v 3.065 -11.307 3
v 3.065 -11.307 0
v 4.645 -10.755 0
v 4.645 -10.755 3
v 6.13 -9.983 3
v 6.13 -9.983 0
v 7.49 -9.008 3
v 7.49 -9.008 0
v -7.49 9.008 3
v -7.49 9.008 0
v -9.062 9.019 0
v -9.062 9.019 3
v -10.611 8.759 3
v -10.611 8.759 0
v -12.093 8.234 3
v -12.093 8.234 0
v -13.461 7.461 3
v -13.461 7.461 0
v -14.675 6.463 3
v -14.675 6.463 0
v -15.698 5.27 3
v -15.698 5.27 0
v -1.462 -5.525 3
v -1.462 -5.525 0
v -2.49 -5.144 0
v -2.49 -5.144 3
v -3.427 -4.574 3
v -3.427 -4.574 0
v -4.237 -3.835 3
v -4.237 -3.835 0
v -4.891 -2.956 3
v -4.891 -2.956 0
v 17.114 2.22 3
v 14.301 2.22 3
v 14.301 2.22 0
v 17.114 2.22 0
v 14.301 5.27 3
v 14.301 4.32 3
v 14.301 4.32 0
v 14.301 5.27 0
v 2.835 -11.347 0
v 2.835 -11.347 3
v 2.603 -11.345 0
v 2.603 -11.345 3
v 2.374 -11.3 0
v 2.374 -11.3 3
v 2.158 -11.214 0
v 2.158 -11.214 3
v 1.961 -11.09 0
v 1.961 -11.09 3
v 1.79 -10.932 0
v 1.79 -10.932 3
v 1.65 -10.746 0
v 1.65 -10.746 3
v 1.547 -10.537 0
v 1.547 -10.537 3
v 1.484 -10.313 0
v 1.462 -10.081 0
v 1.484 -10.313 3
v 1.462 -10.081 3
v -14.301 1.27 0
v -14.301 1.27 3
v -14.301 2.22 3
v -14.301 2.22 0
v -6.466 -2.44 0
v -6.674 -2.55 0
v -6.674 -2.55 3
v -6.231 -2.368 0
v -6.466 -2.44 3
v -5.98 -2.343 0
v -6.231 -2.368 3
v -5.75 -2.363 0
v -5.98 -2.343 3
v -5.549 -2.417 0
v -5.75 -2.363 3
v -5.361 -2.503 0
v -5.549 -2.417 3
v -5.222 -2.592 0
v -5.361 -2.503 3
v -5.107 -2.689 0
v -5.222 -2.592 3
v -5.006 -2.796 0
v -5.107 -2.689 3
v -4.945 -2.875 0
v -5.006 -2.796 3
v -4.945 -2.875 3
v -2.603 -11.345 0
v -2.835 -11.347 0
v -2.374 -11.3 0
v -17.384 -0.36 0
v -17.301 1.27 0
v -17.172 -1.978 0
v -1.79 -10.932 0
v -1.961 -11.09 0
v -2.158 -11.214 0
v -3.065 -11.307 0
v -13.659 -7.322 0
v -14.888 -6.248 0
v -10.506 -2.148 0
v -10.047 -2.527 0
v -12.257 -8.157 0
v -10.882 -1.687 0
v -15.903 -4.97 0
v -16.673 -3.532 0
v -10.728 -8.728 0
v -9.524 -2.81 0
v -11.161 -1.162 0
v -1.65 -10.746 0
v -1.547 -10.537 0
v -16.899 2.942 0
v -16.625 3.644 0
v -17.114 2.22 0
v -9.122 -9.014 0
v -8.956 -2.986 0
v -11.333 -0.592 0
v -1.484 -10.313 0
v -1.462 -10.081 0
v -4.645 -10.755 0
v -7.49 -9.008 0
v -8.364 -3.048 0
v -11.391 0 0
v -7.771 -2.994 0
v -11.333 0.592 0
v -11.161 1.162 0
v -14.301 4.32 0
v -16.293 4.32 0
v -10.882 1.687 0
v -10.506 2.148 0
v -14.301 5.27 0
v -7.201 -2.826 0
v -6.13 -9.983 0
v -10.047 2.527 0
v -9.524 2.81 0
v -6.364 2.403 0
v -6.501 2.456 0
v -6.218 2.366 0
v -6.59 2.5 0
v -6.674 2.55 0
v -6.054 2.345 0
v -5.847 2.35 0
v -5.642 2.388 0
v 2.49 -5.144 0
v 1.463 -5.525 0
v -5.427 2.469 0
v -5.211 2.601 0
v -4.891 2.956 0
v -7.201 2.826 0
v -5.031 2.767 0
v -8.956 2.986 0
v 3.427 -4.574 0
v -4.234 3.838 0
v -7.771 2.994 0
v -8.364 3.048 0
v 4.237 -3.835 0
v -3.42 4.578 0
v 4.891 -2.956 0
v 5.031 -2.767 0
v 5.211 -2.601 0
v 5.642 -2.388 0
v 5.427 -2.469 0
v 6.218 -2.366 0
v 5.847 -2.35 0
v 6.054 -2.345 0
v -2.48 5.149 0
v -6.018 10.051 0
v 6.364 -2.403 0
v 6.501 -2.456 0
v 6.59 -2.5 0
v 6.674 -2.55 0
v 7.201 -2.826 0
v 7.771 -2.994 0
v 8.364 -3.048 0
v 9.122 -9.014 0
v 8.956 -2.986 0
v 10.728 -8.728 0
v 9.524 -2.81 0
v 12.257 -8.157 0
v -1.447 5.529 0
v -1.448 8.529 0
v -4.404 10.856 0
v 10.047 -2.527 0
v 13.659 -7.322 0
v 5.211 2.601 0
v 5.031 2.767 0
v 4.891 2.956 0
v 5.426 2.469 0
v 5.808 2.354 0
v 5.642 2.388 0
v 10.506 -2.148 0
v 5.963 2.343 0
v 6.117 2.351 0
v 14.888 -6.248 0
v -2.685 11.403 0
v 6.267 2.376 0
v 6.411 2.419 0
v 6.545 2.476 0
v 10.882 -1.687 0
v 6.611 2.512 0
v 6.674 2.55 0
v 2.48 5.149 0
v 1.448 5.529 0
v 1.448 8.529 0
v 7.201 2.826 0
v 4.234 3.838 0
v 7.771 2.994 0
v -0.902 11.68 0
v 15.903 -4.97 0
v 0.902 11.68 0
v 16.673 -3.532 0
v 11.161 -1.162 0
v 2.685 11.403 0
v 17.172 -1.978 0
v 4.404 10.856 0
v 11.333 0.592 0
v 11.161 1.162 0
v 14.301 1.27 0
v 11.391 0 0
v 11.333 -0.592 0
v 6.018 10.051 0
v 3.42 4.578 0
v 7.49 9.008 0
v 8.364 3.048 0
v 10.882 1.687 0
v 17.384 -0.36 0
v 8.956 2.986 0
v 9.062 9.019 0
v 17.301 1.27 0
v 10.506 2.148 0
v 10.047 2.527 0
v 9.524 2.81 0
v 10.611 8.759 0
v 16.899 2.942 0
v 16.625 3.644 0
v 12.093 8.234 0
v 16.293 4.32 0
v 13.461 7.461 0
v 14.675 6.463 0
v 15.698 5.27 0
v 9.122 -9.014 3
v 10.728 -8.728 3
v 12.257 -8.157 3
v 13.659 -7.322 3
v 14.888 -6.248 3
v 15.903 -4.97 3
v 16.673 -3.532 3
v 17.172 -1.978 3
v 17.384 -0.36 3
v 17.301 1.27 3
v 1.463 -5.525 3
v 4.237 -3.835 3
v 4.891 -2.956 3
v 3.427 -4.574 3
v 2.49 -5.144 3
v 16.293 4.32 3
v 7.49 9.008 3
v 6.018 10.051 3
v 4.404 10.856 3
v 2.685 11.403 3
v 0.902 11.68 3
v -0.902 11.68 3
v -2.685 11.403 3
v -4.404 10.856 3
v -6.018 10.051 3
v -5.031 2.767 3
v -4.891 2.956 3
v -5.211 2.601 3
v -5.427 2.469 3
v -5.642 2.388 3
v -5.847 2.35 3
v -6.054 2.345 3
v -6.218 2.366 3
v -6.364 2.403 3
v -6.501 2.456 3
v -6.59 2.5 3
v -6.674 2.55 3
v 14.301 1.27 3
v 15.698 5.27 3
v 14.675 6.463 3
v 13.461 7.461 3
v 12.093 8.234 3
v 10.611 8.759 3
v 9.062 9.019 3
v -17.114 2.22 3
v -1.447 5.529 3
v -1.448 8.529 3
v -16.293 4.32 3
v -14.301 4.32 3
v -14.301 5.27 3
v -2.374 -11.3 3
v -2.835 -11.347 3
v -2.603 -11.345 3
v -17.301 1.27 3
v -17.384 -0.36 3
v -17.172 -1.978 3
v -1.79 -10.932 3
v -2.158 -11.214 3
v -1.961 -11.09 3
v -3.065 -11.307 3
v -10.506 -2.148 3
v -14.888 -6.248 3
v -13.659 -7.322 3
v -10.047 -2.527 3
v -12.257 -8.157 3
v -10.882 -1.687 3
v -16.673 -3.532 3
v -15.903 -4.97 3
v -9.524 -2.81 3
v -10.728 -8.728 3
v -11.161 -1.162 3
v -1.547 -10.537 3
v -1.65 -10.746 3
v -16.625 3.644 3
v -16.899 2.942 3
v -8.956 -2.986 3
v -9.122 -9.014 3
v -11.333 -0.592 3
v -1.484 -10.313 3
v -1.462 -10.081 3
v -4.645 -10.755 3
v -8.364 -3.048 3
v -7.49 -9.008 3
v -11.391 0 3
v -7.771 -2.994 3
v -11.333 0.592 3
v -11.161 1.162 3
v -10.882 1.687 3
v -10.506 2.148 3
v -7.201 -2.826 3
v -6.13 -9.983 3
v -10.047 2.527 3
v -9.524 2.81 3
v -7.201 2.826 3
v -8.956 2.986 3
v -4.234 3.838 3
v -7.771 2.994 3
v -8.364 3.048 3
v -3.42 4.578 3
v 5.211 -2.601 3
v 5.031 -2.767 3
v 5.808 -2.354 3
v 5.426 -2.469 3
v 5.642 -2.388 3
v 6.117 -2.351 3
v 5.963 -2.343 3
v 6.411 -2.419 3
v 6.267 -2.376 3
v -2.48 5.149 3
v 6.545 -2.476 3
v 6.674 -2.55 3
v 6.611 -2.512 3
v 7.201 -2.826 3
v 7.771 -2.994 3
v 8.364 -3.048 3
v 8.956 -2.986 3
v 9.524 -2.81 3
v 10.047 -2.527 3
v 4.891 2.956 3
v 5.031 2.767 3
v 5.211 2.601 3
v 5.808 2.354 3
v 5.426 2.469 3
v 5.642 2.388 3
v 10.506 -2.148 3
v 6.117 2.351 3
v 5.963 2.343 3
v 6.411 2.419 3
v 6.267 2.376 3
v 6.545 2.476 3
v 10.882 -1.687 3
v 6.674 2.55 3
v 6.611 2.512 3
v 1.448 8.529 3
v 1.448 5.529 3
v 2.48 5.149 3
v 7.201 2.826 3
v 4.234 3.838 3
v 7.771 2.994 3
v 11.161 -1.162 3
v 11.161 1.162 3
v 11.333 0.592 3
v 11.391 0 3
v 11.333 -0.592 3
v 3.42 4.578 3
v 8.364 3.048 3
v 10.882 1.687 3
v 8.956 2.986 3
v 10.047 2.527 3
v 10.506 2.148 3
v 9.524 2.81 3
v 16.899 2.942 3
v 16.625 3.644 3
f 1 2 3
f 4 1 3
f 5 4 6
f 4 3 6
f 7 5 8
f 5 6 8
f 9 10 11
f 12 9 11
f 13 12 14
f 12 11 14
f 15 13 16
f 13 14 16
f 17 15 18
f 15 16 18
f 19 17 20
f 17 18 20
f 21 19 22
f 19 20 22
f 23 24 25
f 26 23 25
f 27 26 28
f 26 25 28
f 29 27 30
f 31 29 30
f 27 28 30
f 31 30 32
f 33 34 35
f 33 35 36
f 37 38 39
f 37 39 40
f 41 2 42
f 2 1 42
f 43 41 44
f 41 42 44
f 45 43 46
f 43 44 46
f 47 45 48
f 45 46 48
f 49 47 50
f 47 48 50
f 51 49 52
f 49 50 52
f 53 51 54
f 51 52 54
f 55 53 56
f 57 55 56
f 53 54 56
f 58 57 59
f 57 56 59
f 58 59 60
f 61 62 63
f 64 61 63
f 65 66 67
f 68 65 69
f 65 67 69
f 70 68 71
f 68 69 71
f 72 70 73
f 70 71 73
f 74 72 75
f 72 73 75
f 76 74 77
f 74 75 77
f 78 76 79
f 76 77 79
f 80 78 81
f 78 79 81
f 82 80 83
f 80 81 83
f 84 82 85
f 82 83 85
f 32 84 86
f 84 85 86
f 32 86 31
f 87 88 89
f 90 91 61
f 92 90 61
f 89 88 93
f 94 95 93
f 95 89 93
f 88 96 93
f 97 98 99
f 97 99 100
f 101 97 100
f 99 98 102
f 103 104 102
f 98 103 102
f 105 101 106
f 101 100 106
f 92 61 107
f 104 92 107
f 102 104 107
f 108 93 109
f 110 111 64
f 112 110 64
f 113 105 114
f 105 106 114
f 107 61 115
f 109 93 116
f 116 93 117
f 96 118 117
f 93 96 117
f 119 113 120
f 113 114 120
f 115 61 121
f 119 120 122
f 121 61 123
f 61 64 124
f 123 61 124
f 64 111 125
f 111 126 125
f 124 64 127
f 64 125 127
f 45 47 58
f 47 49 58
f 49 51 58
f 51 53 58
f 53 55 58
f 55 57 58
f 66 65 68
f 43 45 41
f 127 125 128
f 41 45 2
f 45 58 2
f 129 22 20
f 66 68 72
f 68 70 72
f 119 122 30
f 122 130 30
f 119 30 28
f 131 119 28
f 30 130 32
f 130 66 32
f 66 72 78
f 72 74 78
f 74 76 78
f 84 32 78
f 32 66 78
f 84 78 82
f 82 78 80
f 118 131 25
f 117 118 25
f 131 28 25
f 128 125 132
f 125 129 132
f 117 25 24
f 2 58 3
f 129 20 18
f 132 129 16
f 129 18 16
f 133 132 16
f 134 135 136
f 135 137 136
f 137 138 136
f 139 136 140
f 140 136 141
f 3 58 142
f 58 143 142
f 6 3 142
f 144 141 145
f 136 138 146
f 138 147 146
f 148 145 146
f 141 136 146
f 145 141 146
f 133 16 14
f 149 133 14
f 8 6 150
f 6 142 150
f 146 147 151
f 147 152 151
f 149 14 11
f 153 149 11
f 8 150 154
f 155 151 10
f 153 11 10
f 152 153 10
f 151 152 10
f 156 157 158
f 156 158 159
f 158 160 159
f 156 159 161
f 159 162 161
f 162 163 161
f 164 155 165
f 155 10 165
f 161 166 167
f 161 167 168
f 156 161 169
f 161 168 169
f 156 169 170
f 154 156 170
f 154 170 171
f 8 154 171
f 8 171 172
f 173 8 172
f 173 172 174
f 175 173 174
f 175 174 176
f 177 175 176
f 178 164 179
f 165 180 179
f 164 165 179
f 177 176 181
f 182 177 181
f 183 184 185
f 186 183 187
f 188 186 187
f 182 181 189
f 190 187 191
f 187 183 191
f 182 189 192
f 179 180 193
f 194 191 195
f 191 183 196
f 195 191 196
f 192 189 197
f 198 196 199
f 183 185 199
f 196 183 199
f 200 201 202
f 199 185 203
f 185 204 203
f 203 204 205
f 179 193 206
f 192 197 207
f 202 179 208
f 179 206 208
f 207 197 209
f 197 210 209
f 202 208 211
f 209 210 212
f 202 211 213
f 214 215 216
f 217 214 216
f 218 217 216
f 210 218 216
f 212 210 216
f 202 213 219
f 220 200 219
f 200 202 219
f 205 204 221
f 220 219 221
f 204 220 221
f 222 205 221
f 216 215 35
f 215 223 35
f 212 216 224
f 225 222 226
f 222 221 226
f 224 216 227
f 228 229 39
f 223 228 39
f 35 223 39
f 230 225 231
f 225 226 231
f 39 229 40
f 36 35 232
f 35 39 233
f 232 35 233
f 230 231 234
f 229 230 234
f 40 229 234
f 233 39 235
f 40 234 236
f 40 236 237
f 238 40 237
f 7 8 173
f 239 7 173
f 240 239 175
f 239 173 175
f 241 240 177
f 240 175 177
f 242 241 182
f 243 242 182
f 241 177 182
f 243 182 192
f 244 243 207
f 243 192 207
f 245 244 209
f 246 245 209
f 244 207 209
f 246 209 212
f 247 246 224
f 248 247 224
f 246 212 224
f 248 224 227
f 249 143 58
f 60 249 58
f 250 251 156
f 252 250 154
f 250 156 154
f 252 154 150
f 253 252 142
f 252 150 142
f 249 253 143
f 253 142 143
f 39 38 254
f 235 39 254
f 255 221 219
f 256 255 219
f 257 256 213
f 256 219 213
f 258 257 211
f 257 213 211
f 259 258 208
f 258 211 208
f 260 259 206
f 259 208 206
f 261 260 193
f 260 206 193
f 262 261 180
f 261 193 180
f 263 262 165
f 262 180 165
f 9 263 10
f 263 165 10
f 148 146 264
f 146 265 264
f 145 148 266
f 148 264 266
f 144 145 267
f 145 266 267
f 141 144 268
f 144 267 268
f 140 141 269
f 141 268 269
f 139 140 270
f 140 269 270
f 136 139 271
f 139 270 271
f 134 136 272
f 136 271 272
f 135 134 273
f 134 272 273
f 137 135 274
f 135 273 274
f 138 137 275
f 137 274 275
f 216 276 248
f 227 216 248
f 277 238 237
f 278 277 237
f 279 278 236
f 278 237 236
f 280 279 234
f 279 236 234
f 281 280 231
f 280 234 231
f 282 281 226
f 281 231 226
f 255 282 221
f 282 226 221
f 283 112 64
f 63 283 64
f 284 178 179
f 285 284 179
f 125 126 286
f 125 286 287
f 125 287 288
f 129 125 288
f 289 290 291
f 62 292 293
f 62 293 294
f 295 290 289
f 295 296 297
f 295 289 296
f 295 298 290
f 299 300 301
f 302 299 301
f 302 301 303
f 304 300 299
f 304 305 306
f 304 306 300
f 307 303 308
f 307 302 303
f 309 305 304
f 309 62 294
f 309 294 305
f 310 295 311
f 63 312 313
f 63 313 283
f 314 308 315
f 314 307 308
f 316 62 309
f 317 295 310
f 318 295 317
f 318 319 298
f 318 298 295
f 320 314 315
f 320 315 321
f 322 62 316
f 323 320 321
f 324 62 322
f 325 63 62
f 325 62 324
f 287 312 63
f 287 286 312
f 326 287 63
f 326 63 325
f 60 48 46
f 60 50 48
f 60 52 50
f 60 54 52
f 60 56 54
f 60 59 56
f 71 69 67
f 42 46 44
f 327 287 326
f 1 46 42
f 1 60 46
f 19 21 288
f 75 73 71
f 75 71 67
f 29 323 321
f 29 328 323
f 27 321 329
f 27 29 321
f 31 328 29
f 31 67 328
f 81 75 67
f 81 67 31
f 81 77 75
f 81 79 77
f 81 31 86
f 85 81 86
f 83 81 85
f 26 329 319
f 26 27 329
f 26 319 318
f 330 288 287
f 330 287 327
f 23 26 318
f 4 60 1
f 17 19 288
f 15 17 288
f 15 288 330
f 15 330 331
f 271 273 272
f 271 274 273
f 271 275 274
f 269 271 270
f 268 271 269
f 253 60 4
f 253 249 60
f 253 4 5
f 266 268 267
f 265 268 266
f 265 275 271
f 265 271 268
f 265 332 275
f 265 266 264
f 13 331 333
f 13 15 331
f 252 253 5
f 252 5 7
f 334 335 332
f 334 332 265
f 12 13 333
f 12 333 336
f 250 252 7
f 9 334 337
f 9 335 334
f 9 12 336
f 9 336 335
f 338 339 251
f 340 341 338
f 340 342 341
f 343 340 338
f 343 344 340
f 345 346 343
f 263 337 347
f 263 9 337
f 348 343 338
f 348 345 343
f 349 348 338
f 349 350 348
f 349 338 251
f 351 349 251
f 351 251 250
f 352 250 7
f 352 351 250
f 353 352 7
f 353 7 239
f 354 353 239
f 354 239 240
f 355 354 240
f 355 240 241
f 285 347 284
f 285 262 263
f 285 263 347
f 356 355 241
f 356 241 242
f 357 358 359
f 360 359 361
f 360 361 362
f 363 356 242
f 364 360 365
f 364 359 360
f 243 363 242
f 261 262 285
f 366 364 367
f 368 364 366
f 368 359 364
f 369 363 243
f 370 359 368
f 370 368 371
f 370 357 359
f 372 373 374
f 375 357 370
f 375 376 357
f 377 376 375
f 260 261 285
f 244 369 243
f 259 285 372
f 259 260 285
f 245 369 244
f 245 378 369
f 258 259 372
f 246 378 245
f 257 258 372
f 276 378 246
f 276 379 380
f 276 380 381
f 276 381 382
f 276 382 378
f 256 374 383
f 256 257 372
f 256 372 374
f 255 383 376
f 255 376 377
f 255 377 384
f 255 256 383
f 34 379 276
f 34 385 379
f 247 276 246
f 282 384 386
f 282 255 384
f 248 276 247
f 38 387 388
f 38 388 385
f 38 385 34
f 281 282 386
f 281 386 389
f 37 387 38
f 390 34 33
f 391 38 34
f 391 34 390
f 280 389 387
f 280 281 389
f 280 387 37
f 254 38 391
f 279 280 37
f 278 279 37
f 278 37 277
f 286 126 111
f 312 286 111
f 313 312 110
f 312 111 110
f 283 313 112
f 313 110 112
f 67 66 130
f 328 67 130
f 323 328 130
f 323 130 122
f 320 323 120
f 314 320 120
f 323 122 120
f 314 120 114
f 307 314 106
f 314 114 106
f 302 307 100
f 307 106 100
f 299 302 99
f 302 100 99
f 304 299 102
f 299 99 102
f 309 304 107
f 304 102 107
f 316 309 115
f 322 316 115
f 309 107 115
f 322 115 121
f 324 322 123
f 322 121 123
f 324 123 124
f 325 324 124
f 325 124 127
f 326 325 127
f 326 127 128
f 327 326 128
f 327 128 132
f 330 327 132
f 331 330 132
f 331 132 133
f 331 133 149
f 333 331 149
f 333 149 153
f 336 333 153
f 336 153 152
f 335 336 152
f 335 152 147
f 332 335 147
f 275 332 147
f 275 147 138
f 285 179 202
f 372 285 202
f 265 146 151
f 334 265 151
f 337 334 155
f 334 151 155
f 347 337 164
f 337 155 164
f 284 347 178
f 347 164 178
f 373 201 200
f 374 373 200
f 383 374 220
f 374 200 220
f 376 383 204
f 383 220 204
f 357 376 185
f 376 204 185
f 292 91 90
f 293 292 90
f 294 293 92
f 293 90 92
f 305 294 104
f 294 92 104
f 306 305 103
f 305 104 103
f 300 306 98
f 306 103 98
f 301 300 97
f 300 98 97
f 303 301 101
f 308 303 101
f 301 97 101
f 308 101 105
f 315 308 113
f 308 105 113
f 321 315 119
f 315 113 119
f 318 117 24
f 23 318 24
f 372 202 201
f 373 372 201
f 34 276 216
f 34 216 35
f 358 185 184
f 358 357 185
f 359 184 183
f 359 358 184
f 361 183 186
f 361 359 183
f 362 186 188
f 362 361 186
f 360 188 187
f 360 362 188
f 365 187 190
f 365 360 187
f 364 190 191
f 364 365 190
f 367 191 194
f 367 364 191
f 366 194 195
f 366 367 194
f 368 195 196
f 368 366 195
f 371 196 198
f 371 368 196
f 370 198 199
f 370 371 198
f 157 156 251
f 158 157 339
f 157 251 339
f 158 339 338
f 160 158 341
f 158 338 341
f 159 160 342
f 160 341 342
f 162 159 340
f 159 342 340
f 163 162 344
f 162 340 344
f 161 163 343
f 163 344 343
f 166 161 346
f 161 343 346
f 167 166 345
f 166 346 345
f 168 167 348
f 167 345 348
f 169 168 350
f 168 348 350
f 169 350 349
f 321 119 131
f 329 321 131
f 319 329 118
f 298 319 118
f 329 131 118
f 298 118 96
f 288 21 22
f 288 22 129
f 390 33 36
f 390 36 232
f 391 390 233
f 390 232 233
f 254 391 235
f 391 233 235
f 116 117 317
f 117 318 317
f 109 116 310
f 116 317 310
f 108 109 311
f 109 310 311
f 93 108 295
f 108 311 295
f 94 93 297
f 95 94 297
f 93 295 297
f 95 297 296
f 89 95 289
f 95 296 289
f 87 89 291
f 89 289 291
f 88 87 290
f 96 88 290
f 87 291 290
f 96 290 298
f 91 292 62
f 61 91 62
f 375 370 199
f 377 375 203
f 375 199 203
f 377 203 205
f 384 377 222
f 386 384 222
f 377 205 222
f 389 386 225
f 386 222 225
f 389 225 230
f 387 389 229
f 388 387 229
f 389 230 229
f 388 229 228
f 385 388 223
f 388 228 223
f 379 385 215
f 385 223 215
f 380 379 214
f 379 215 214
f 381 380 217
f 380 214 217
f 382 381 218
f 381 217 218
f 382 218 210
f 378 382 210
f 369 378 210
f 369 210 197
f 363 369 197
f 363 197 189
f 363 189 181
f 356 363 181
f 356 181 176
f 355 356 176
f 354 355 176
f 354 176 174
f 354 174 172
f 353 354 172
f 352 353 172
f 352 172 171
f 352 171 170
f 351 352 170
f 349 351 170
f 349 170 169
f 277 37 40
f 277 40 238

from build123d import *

# Parameters (mm, degrees)
EXTRUDE_1_DEPTH     = 3
SKETCH_2_W          = 3
SKETCH_2_H          = 0.95
CUT_EXTRUDE_1_DEPTH = 3
FILLET_1_R          = 1.27


with BuildPart() as part:
    # 스케치1 → 보스-돌출1 (new body)
    with BuildSketch(Plane.XY):
        with BuildLine():
            Line((-1.4475, 8.528649813), (1.4475, 8.528649813))
            Line((1.4475, 8.528649813), (1.4475, 5.528649813))
            ThreePointArc((1.4475, 5.528649813), (4.105207543, 3.975989943), (5.572102386, 1.27))
            ThreePointArc((5.572102386, 1.27), (11.390915263, 0), (5.572102386, -1.27))
            ThreePointArc((5.572102386, -1.27), (4.110599393, -3.970415297), (1.4625, -5.524700784))
            Line((1.4625, -5.524700784), (1.4625, -11.623352303))
            ThreePointArc((1.4625, -11.623352303), (4.663454339, -10.746786433), (7.490136969, -9.007722974))
            ThreePointArc((7.490136969, -9.007722974), (17.390915263, 0), (7.490136969, 9.007722974))
            ThreePointArc((7.490136969, 9.007722974), (0, 11.715), (-7.490136969, 9.007722974))
            ThreePointArc((-7.490136969, 9.007722974), (-17.390915263, 0), (-7.490136969, -9.007722974))
            ThreePointArc((-7.490136969, -9.007722974), (-4.663454339, -10.746786433), (-1.4625, -11.623352303))
            Line((-1.4625, -11.623352303), (-1.4625, -5.524700784))
            ThreePointArc((-1.4625, -5.524700784), (-4.110599393, -3.970415297), (-5.572102386, -1.27))
            ThreePointArc((-5.572102386, -1.27), (-11.390915263, 0), (-5.572102386, 1.27))
            ThreePointArc((-5.572102386, 1.27), (-4.105207543, 3.975989943), (-1.4475, 5.528649813))
            Line((-1.4475, 5.528649813), (-1.4475, 8.528649813))
        make_face()
    extrude(amount=EXTRUDE_1_DEPTH)

    # 스케치2 → 컷-돌출1 (cut)
    with BuildSketch(Plane.XY.offset(3)):
        with Locations((15.801341687, 1.745)):
            Rectangle(SKETCH_2_W, SKETCH_2_H)
        with Locations((-15.801341687, 4.795)):
            Rectangle(SKETCH_2_W, SKETCH_2_H)
        with Locations((-15.801341687, 1.745)):
            Rectangle(SKETCH_2_W, SKETCH_2_H)
        with Locations((15.801341687, 4.795)):
            Rectangle(SKETCH_2_W, SKETCH_2_H)
    extrude(amount=-CUT_EXTRUDE_1_DEPTH, mode=Mode.SUBTRACT)

    # 필렛1
    fillet_1_edges = [part.edges().sort_by_distance(p)[0] for p in [
        (-5.572102386, 1.27, 1.5),
        (-5.572102386, -1.27, 1.5),
        (-1.4625, -11.623352303, 1.5),
        (1.4625, -11.623352303, 1.5),
        (5.572102386, -1.27, 1.5),
        (5.572102386, 1.27, 1.5),
    ]]
    fillet(fillet_1_edges, radius=FILLET_1_R)


solid = part.part
